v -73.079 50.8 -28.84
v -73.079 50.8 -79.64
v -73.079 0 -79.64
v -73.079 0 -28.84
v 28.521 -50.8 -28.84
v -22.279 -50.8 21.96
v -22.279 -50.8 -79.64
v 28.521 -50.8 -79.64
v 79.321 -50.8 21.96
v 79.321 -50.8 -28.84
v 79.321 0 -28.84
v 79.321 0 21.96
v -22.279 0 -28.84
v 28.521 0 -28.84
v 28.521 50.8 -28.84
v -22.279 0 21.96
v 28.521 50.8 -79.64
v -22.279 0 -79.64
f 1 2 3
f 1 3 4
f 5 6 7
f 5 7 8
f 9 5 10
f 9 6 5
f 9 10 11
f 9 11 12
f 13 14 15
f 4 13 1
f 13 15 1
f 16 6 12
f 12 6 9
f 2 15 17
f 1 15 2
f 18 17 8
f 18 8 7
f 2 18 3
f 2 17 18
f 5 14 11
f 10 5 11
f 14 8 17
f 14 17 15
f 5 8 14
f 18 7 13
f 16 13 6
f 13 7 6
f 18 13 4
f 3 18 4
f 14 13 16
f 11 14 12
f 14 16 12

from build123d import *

# Parameters (mm, degrees)
F1_W     = 50.8
F1_H     = 50.8
F2_DEPTH = 50.8
F3_W     = 50.8
F3_H     = 50.8
F4_DEPTH = 50.8
F5_W     = 50.8
F5_H     = 50.8
F6_DEPTH = 101.6
F7_W     = 50.8
F7_H     = 50.8
F8_DEPTH = 50.8


# Not quite as in the source:
# - a variable given as a bare number and used for a length is read in inches; the dataset says mm whatever the document's units were


with BuildPart() as f2:
    # F1 (on Front) → F2 (new body)
    with BuildSketch(Plane.XZ):
        with Locations((3.1213257462, -3.4399425406)):
            Rectangle(F1_W, F1_H)
    extrude(amount=F2_DEPTH)

    # F3 (on face) → F4 (join)
    with BuildSketch(Plane.XZ.offset(50.8)):
        with Locations((53.9213257462, -3.4399425406)):
            Rectangle(F3_W, F3_H)
    extrude(amount=-F4_DEPTH)

    # F5 (on face) → F6 (join)
    with BuildSketch(Plane.XZ.offset(50.8)):
        with Locations((3.1213257462, -54.2399425406)):
            Rectangle(F5_W, F5_H)
    extrude(amount=-F6_DEPTH)

    # F7 (on face) → F8 (join)
    with BuildSketch(Plane(origin=(0, 50.8, 0), x_dir=(-1, 0, 0), z_dir=(0, 1, 0))):
        with Locations((47.6786742538, -54.2399425406)):
            Rectangle(F7_W, F7_H)
    extrude(amount=-F8_DEPTH)


solid = f2.part
